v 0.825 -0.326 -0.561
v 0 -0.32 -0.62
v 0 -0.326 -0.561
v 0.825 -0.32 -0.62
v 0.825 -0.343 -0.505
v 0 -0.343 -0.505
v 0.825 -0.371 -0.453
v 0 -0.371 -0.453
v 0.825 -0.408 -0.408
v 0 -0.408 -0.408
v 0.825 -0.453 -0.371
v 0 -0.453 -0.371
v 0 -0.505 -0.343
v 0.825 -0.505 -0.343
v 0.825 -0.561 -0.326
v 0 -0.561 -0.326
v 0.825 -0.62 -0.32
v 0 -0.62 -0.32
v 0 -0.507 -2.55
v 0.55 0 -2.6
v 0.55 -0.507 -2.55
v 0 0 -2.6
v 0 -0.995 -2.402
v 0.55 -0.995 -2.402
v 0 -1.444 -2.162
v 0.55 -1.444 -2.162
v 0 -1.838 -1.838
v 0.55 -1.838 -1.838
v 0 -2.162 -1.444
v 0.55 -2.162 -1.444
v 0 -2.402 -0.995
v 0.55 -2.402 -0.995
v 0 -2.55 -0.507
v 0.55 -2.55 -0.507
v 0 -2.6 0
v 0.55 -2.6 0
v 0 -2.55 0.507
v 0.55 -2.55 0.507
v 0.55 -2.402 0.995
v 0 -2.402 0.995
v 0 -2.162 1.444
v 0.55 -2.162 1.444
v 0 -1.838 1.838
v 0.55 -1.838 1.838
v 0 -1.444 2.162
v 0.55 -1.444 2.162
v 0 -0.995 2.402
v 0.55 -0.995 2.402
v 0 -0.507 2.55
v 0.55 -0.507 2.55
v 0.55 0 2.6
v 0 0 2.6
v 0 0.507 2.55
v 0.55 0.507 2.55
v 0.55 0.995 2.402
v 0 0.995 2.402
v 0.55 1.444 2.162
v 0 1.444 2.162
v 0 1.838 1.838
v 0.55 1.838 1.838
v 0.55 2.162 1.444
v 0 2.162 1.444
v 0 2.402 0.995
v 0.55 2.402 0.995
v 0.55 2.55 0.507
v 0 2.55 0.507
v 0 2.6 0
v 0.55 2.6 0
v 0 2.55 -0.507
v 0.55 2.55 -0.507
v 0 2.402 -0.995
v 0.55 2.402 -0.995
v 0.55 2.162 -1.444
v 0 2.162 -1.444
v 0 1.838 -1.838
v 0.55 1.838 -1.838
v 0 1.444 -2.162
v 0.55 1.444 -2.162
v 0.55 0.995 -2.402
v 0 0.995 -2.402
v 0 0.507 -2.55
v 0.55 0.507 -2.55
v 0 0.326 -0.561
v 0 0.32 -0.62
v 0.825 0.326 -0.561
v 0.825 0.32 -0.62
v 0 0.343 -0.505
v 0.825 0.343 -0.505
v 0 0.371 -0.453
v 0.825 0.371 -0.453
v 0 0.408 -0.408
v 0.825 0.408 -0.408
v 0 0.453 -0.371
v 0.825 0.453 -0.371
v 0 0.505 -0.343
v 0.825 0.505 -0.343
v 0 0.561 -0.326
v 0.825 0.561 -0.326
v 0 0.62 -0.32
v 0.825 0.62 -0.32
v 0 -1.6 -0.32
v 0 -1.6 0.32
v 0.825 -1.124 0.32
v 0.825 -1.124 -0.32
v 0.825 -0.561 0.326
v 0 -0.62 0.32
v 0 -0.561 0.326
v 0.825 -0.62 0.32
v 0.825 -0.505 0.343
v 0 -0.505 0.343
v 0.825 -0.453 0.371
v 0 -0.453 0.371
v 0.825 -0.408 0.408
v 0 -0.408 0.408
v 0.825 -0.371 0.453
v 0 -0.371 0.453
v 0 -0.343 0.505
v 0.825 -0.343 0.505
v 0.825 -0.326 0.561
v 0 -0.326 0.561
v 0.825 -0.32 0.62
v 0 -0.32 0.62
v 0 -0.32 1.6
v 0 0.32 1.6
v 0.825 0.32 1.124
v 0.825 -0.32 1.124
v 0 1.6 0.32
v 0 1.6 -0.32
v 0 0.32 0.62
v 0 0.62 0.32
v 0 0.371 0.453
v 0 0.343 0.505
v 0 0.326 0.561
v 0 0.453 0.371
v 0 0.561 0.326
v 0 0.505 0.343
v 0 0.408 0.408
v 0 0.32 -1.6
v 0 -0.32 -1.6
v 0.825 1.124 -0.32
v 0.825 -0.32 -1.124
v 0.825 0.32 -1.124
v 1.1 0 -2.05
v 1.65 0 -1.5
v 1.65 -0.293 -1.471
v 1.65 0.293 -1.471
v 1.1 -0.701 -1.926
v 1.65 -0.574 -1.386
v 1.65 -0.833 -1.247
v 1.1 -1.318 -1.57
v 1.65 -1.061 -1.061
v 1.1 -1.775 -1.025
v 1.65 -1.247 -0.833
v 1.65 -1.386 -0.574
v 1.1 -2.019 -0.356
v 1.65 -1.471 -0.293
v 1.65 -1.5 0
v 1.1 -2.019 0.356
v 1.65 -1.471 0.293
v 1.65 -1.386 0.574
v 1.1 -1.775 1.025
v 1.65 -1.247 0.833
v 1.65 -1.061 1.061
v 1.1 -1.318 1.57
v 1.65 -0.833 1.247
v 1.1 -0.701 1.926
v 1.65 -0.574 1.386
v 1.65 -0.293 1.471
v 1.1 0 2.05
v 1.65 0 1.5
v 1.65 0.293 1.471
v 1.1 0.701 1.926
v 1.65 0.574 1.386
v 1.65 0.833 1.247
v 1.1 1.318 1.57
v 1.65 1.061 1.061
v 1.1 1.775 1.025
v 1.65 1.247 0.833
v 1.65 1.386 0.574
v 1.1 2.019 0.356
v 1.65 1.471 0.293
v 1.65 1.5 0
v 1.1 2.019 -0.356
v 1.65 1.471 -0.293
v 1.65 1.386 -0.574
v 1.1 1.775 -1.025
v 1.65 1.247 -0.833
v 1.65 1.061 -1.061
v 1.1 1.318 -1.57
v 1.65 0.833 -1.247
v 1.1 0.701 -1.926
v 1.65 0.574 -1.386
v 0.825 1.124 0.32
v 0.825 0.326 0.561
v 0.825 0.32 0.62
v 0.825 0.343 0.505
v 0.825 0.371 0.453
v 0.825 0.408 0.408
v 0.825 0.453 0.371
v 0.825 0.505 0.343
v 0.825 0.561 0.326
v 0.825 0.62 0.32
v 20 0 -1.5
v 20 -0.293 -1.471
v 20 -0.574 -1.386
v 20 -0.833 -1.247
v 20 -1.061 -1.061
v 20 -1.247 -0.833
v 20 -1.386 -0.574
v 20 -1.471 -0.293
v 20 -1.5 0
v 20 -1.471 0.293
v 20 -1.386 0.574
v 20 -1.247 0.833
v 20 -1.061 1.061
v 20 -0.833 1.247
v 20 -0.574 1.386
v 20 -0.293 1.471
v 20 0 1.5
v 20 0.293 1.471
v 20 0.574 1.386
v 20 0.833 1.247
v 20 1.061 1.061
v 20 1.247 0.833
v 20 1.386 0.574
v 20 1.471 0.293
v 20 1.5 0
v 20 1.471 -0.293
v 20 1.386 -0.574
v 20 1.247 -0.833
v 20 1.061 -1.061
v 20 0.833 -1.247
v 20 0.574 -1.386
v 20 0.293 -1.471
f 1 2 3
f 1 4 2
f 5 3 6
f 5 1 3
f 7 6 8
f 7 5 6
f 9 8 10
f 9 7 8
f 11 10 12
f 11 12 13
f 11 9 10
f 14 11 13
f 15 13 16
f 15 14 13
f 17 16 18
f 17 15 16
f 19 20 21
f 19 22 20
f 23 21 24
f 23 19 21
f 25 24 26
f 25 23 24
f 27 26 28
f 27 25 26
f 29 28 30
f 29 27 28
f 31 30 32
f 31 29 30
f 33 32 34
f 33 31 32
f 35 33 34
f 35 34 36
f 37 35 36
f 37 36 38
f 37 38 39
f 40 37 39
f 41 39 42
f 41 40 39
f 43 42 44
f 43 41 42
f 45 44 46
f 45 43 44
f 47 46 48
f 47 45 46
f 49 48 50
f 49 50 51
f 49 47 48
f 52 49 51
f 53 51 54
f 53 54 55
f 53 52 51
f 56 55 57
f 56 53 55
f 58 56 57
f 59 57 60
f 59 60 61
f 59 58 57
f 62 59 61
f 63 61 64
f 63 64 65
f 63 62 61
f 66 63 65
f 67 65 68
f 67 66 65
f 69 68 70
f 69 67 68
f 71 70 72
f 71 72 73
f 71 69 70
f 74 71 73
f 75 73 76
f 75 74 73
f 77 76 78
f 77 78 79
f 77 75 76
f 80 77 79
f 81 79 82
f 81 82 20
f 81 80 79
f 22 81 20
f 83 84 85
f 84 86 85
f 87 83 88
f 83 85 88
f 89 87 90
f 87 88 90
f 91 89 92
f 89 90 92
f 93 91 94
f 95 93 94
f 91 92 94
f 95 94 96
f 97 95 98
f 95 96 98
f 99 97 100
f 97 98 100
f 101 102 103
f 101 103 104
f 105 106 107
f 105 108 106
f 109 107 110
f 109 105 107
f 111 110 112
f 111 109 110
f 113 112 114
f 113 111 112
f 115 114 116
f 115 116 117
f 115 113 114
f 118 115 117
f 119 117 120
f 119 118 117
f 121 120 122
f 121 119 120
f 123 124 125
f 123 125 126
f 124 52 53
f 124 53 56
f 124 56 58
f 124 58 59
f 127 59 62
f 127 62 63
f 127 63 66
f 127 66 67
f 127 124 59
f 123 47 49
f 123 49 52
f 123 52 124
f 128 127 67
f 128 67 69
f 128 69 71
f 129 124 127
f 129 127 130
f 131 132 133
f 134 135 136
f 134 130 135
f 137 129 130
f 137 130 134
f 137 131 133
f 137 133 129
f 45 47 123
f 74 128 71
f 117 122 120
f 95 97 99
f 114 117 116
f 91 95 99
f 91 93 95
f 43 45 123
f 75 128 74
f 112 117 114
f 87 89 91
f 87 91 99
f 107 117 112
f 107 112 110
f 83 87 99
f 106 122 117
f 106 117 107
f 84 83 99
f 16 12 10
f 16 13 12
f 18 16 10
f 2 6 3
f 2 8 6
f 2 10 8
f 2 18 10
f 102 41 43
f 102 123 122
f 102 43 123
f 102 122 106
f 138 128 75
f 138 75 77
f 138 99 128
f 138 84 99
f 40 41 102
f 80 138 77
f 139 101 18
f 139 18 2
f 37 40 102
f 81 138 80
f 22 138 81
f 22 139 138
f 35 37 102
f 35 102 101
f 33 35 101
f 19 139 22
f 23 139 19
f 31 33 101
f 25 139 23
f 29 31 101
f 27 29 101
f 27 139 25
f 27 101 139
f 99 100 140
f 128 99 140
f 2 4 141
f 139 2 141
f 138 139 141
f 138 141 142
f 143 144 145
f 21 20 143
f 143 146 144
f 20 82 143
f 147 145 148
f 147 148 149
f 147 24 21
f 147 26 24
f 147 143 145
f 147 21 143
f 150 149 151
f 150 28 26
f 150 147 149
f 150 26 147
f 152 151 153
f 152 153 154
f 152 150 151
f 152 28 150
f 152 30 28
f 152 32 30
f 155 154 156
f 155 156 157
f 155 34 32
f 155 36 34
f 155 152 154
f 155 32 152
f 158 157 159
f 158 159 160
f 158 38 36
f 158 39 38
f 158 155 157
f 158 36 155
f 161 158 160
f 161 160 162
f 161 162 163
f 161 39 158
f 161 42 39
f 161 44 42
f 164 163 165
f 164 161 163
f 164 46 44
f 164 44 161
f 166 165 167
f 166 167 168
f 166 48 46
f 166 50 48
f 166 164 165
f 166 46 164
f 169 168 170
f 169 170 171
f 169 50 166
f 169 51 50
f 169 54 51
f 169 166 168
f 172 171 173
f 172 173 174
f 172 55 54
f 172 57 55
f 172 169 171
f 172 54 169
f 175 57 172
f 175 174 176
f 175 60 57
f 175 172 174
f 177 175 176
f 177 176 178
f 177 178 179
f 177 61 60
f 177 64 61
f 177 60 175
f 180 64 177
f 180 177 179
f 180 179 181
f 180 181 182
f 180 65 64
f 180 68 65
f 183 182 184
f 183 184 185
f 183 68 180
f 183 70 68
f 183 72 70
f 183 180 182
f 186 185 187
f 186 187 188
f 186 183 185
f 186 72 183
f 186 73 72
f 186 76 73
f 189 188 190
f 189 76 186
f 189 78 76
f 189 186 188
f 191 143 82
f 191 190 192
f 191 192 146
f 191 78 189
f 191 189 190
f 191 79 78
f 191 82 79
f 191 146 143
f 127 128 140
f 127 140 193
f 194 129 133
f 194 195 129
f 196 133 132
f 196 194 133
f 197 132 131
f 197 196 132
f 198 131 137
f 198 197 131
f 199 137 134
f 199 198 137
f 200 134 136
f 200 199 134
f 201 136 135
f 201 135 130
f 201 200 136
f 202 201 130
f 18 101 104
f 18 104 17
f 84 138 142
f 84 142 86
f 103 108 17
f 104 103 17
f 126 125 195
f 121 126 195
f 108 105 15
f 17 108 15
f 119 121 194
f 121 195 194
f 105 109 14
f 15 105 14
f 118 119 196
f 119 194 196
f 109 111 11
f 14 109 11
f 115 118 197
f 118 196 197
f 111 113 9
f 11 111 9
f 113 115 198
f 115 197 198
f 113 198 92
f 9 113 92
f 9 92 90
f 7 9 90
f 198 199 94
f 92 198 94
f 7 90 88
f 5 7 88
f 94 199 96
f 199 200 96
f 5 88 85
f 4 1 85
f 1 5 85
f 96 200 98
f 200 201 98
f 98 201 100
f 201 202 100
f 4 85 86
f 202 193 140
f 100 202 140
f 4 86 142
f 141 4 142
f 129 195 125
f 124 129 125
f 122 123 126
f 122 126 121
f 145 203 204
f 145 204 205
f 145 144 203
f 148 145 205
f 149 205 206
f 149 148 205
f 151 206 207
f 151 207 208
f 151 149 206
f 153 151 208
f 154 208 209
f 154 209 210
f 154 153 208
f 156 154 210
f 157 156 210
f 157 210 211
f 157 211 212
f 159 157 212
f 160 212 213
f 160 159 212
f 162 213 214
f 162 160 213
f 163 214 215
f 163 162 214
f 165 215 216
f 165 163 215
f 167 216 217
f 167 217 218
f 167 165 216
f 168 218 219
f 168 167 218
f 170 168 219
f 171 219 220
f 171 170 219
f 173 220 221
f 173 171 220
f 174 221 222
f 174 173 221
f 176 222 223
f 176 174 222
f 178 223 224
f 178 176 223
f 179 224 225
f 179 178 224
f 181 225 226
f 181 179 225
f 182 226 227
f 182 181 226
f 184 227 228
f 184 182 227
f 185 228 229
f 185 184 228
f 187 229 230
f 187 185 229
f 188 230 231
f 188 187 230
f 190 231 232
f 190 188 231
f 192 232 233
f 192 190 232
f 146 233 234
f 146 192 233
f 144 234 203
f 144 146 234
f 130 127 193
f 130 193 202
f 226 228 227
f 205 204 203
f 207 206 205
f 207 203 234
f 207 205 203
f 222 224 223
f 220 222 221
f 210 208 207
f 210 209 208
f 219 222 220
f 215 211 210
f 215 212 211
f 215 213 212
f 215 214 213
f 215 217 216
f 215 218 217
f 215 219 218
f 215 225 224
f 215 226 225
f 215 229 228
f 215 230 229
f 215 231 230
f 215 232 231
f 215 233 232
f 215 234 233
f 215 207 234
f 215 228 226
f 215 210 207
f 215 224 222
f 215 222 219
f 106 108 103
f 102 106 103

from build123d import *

# Parameters (mm, degrees)
CROSSRECESS_DEPTH = 0.825
DRAFT9_ANGLE      = 30
FILLET5_R         = 0.3


with BuildPart() as part:
    # Sketch1 → Base (revolve)
    with BuildSketch(Plane.XY, mode=Mode.PRIVATE) as base_sk:
        Polygon((20, 1.5), (2.65, 1.5), (1.65, 1.5), (0.55, 2.6), (0, 2.6), (0, 0), (20, 0), align=None)
    revolve(base_sk.sketch.rotate(Axis((4.515812911, 0, 0), (-1, 0, 0)), 90), axis=Axis((4.515812911, 0, 0), (-1, 0, 0)))

    # Sketch6 → CrossRecess (cut)
    with BuildSketch(Plane(origin=(0, 0, 0), x_dir=(0, 0, -1), z_dir=(1, 0, 0))):
        Polygon((0.32, 0.32), (0.32, 1.6), (-0.32, 1.6), (-0.32, 0.32), (-1.6, 0.32), (-1.6, -0.32), (-0.32, -0.32), (-0.32, -1.6), (0.32, -1.6), (0.32, -0.32), (1.6, -0.32), (1.6, 0.32), align=None)
    extrude(amount=CROSSRECESS_DEPTH, mode=Mode.SUBTRACT)

    # Draft9
    draft9_faces = [part.faces().sort_by_distance(p)[0] for p in [
        (0.4125, 1.6, 0),
        (0.4125, 0, 1.6),
        (0.4125, -1.6, 0),
        (0.4125, 0, -1.6),
    ]]
    draft(draft9_faces, Plane(origin=(0, 2.6, 0), x_dir=(0, 0, -1), z_dir=(-1, 0, 0)), DRAFT9_ANGLE)

    # Fillet5
    fillet5_edges = [part.edges().sort_by_distance(p)[0] for p in [
        (0.4125, 0.32, 0.32),
        (0.4125, -0.32, 0.32),
        (0.4125, -0.32, -0.32),
        (0.4125, 0.32, -0.32),
    ]]
    fillet(fillet5_edges, radius=FILLET5_R)


solid = part.part
